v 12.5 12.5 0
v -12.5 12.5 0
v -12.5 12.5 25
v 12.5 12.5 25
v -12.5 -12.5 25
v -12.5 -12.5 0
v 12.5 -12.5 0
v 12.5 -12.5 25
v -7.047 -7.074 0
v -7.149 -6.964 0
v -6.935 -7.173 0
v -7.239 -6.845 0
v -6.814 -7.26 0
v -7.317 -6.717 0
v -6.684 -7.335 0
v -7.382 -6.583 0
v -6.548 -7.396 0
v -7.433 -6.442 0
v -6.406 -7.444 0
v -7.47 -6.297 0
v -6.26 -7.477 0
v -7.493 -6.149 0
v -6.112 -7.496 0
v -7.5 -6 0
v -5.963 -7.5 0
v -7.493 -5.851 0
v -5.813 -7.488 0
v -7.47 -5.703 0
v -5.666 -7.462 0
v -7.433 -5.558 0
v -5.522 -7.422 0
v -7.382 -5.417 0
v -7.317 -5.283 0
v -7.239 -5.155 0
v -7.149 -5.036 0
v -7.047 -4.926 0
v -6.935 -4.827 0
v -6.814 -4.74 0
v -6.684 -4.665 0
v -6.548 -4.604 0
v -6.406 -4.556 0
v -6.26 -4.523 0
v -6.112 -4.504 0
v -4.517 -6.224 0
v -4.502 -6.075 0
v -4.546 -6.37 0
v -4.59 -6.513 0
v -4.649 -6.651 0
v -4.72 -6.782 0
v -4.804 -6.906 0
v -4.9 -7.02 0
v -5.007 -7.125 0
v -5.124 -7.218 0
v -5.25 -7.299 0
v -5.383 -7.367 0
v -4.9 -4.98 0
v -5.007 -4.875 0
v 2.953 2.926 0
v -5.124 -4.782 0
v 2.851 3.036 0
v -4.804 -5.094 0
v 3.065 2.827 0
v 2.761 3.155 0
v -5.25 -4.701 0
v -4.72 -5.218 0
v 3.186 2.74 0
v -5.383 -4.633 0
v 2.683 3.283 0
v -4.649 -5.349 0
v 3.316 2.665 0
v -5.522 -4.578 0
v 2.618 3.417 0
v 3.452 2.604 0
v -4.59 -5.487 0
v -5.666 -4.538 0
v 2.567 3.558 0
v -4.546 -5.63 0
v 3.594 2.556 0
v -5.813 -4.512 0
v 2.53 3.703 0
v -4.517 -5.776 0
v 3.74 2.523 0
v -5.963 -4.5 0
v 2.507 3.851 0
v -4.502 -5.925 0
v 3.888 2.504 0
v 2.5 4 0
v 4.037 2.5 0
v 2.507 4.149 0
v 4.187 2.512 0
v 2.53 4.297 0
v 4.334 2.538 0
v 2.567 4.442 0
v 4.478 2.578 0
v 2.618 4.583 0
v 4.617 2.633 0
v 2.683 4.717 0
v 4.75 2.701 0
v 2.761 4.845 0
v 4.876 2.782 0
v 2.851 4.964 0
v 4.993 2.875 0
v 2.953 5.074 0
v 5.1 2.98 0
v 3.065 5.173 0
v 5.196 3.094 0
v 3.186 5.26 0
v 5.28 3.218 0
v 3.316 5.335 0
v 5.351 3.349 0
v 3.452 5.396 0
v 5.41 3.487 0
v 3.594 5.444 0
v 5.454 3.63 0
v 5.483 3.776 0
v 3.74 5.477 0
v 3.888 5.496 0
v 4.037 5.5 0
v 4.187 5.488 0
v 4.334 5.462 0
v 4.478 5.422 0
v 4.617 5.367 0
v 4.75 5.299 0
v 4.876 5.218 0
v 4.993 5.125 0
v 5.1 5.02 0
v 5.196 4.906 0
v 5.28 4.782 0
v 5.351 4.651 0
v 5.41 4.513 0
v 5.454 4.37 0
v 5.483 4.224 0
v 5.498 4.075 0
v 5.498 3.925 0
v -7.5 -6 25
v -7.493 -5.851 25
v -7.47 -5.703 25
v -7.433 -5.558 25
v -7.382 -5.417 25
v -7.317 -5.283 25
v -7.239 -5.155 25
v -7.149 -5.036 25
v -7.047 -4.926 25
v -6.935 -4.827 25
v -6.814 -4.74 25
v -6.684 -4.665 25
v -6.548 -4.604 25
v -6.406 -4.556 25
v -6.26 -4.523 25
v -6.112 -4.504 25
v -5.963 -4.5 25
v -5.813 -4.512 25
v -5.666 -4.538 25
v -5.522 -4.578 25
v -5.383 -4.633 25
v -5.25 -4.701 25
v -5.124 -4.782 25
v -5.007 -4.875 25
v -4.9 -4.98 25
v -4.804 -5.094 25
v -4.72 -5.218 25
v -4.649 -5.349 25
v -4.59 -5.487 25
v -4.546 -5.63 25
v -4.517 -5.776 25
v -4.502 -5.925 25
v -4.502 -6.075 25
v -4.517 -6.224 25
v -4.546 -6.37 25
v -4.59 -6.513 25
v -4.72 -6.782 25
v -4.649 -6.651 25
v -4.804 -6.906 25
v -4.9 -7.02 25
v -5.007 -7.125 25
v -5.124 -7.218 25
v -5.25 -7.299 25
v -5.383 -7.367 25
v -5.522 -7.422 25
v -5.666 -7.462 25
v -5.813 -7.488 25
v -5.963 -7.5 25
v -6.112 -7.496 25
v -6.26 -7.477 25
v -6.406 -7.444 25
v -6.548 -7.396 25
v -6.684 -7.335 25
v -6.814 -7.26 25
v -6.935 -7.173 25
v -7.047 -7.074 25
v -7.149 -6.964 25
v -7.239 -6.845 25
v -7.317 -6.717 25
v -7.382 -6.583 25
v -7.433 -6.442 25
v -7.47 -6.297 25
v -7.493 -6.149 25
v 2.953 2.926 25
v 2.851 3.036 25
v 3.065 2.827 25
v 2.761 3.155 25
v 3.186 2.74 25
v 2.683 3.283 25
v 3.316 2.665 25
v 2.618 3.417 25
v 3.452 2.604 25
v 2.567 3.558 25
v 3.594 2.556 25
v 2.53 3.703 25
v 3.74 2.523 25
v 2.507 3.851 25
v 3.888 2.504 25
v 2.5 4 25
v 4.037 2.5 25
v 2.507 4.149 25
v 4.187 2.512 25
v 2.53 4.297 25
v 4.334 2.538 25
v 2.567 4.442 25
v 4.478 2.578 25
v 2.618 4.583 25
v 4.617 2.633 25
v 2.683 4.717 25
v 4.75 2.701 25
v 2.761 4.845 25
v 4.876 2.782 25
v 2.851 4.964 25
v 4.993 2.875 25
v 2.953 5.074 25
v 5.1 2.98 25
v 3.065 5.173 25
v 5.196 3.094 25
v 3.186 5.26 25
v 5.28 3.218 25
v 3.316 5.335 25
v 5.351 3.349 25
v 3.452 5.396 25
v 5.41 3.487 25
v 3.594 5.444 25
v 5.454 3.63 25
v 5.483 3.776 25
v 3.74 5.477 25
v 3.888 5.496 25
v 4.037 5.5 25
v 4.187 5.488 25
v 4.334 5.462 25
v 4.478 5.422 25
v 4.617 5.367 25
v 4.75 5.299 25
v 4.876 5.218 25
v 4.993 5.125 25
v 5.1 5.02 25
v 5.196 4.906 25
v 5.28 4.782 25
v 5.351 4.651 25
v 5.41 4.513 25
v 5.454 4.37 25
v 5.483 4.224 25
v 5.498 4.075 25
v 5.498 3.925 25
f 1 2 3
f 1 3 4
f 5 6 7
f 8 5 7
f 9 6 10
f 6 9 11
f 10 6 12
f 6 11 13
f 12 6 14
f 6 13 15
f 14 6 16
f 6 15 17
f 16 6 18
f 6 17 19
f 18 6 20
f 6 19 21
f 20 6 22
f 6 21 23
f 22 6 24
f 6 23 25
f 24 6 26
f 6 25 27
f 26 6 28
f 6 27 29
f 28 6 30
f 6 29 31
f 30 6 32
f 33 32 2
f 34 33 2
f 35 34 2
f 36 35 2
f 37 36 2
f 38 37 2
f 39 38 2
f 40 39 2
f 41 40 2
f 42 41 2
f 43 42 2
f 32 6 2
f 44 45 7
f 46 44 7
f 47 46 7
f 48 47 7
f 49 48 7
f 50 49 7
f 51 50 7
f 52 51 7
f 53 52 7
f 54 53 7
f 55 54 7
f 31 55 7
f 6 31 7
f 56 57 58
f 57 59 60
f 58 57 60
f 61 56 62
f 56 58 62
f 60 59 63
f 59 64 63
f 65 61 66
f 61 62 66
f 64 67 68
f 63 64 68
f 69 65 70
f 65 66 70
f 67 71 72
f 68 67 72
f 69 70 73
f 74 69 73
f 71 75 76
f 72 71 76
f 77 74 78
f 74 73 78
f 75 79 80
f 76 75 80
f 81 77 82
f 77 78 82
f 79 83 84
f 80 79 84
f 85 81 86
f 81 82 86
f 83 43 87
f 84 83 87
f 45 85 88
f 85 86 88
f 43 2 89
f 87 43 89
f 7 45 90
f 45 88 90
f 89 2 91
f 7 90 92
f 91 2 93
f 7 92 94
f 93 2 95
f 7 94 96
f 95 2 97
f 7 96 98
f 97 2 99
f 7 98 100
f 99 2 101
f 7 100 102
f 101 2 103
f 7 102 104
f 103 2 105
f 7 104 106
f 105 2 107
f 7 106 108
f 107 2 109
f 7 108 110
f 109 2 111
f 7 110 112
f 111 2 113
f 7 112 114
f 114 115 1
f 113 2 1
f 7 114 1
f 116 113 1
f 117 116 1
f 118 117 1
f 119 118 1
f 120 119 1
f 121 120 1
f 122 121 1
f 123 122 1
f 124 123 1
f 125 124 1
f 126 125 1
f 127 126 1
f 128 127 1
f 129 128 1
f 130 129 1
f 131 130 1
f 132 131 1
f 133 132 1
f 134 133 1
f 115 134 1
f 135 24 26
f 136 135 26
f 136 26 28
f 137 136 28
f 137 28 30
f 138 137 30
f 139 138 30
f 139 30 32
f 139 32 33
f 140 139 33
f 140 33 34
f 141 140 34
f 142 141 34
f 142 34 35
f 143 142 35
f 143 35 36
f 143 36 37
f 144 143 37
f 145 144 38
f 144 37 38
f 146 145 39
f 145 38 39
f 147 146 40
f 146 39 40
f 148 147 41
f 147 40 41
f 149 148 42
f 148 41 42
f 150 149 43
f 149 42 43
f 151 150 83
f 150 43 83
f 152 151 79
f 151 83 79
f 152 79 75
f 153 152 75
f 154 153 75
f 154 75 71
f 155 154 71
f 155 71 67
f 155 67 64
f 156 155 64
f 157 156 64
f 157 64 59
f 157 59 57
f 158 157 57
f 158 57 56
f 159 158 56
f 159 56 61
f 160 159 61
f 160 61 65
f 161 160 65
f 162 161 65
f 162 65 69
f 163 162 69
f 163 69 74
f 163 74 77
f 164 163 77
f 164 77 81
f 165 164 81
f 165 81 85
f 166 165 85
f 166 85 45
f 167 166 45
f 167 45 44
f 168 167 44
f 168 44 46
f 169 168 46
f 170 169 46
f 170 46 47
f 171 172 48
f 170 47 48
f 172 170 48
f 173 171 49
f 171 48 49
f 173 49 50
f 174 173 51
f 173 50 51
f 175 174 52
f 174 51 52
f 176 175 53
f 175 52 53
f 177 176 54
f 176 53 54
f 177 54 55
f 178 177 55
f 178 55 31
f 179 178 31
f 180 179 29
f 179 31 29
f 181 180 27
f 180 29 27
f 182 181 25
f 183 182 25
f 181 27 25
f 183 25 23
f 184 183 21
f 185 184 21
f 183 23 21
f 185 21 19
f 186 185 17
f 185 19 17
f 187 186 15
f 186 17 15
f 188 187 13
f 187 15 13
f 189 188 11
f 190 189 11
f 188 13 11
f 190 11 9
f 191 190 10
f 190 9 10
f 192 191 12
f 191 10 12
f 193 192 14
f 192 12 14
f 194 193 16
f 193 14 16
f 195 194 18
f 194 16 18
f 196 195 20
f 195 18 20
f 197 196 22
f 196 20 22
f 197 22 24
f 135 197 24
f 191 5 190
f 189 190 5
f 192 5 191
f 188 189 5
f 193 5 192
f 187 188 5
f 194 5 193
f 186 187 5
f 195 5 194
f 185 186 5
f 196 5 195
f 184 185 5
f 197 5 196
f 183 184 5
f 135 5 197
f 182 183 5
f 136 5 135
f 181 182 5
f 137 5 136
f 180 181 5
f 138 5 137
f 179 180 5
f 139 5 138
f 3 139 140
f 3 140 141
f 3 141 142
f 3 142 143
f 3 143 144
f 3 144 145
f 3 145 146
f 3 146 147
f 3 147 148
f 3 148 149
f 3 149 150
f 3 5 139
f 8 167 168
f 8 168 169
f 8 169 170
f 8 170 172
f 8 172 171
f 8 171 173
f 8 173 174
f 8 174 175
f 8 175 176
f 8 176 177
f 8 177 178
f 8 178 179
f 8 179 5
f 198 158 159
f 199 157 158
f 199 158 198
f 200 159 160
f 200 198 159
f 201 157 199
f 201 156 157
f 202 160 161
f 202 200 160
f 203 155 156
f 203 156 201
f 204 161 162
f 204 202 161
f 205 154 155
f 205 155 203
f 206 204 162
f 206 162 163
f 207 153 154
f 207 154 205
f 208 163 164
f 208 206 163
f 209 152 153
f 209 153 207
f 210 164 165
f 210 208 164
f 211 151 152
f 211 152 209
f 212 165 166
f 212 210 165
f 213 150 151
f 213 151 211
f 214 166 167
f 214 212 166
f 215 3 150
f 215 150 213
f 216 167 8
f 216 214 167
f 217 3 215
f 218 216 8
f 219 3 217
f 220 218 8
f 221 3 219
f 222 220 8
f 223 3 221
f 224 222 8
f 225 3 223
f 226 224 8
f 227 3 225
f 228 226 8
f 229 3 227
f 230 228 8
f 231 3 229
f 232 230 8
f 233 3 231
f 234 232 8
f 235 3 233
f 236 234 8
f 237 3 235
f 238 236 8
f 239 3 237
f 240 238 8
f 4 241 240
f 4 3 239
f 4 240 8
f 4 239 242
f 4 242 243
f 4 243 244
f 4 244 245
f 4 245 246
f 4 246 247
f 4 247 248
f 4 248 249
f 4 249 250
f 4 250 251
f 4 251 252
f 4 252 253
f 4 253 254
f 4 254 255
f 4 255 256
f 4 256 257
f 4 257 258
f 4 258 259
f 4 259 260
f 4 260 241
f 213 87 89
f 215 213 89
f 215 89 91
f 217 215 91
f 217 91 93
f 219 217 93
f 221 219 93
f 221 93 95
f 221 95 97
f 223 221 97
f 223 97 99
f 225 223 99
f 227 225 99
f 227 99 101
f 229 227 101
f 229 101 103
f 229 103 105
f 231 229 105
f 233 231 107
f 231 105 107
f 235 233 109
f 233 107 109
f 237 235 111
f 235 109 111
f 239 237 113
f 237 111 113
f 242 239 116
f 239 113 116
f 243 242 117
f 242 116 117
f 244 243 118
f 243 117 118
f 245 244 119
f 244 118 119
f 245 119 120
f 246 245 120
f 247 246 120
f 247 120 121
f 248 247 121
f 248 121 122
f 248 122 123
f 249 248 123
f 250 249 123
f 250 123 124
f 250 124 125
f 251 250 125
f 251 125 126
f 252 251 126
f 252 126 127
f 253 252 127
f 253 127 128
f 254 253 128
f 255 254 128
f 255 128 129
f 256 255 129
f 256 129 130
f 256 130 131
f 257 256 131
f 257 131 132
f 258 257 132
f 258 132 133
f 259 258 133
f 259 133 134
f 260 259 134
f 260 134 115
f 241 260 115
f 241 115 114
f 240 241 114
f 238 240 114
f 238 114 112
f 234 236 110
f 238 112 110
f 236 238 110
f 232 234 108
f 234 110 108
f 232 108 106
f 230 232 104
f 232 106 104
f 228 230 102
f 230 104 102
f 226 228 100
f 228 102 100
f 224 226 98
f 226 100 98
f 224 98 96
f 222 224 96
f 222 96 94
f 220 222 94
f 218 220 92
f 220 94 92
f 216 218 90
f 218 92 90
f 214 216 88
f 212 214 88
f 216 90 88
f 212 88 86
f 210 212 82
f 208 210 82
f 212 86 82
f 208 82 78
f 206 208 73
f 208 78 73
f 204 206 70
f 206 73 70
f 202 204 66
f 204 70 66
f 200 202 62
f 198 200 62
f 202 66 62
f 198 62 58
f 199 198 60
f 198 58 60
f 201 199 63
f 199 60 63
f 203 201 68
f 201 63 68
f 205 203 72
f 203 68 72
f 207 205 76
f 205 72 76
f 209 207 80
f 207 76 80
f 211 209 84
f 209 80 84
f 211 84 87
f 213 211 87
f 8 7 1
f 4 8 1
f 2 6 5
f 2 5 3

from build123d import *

# Parameters (mm, degrees)
F0_W     = 25
F0_H     = 25
F1_DEPTH = 25
F3_D     = 3
F5_D     = 3


with BuildPart() as f1:
    # F0 (on Top) → F1 (new body)
    with BuildSketch(Plane.XY):
        Rectangle(F0_W, F0_H)
    extrude(amount=F1_DEPTH)

    # F3 (through all)
    with Locations(Plane.XY.offset(25)):
        with Locations((-6, -6)):
            Hole(F3_D / 2)

    # F5 (through all)
    with Locations(Plane.XY.offset(25)):
        with Locations((4, 4)):
            Hole(F5_D / 2)


solid = f1.part
